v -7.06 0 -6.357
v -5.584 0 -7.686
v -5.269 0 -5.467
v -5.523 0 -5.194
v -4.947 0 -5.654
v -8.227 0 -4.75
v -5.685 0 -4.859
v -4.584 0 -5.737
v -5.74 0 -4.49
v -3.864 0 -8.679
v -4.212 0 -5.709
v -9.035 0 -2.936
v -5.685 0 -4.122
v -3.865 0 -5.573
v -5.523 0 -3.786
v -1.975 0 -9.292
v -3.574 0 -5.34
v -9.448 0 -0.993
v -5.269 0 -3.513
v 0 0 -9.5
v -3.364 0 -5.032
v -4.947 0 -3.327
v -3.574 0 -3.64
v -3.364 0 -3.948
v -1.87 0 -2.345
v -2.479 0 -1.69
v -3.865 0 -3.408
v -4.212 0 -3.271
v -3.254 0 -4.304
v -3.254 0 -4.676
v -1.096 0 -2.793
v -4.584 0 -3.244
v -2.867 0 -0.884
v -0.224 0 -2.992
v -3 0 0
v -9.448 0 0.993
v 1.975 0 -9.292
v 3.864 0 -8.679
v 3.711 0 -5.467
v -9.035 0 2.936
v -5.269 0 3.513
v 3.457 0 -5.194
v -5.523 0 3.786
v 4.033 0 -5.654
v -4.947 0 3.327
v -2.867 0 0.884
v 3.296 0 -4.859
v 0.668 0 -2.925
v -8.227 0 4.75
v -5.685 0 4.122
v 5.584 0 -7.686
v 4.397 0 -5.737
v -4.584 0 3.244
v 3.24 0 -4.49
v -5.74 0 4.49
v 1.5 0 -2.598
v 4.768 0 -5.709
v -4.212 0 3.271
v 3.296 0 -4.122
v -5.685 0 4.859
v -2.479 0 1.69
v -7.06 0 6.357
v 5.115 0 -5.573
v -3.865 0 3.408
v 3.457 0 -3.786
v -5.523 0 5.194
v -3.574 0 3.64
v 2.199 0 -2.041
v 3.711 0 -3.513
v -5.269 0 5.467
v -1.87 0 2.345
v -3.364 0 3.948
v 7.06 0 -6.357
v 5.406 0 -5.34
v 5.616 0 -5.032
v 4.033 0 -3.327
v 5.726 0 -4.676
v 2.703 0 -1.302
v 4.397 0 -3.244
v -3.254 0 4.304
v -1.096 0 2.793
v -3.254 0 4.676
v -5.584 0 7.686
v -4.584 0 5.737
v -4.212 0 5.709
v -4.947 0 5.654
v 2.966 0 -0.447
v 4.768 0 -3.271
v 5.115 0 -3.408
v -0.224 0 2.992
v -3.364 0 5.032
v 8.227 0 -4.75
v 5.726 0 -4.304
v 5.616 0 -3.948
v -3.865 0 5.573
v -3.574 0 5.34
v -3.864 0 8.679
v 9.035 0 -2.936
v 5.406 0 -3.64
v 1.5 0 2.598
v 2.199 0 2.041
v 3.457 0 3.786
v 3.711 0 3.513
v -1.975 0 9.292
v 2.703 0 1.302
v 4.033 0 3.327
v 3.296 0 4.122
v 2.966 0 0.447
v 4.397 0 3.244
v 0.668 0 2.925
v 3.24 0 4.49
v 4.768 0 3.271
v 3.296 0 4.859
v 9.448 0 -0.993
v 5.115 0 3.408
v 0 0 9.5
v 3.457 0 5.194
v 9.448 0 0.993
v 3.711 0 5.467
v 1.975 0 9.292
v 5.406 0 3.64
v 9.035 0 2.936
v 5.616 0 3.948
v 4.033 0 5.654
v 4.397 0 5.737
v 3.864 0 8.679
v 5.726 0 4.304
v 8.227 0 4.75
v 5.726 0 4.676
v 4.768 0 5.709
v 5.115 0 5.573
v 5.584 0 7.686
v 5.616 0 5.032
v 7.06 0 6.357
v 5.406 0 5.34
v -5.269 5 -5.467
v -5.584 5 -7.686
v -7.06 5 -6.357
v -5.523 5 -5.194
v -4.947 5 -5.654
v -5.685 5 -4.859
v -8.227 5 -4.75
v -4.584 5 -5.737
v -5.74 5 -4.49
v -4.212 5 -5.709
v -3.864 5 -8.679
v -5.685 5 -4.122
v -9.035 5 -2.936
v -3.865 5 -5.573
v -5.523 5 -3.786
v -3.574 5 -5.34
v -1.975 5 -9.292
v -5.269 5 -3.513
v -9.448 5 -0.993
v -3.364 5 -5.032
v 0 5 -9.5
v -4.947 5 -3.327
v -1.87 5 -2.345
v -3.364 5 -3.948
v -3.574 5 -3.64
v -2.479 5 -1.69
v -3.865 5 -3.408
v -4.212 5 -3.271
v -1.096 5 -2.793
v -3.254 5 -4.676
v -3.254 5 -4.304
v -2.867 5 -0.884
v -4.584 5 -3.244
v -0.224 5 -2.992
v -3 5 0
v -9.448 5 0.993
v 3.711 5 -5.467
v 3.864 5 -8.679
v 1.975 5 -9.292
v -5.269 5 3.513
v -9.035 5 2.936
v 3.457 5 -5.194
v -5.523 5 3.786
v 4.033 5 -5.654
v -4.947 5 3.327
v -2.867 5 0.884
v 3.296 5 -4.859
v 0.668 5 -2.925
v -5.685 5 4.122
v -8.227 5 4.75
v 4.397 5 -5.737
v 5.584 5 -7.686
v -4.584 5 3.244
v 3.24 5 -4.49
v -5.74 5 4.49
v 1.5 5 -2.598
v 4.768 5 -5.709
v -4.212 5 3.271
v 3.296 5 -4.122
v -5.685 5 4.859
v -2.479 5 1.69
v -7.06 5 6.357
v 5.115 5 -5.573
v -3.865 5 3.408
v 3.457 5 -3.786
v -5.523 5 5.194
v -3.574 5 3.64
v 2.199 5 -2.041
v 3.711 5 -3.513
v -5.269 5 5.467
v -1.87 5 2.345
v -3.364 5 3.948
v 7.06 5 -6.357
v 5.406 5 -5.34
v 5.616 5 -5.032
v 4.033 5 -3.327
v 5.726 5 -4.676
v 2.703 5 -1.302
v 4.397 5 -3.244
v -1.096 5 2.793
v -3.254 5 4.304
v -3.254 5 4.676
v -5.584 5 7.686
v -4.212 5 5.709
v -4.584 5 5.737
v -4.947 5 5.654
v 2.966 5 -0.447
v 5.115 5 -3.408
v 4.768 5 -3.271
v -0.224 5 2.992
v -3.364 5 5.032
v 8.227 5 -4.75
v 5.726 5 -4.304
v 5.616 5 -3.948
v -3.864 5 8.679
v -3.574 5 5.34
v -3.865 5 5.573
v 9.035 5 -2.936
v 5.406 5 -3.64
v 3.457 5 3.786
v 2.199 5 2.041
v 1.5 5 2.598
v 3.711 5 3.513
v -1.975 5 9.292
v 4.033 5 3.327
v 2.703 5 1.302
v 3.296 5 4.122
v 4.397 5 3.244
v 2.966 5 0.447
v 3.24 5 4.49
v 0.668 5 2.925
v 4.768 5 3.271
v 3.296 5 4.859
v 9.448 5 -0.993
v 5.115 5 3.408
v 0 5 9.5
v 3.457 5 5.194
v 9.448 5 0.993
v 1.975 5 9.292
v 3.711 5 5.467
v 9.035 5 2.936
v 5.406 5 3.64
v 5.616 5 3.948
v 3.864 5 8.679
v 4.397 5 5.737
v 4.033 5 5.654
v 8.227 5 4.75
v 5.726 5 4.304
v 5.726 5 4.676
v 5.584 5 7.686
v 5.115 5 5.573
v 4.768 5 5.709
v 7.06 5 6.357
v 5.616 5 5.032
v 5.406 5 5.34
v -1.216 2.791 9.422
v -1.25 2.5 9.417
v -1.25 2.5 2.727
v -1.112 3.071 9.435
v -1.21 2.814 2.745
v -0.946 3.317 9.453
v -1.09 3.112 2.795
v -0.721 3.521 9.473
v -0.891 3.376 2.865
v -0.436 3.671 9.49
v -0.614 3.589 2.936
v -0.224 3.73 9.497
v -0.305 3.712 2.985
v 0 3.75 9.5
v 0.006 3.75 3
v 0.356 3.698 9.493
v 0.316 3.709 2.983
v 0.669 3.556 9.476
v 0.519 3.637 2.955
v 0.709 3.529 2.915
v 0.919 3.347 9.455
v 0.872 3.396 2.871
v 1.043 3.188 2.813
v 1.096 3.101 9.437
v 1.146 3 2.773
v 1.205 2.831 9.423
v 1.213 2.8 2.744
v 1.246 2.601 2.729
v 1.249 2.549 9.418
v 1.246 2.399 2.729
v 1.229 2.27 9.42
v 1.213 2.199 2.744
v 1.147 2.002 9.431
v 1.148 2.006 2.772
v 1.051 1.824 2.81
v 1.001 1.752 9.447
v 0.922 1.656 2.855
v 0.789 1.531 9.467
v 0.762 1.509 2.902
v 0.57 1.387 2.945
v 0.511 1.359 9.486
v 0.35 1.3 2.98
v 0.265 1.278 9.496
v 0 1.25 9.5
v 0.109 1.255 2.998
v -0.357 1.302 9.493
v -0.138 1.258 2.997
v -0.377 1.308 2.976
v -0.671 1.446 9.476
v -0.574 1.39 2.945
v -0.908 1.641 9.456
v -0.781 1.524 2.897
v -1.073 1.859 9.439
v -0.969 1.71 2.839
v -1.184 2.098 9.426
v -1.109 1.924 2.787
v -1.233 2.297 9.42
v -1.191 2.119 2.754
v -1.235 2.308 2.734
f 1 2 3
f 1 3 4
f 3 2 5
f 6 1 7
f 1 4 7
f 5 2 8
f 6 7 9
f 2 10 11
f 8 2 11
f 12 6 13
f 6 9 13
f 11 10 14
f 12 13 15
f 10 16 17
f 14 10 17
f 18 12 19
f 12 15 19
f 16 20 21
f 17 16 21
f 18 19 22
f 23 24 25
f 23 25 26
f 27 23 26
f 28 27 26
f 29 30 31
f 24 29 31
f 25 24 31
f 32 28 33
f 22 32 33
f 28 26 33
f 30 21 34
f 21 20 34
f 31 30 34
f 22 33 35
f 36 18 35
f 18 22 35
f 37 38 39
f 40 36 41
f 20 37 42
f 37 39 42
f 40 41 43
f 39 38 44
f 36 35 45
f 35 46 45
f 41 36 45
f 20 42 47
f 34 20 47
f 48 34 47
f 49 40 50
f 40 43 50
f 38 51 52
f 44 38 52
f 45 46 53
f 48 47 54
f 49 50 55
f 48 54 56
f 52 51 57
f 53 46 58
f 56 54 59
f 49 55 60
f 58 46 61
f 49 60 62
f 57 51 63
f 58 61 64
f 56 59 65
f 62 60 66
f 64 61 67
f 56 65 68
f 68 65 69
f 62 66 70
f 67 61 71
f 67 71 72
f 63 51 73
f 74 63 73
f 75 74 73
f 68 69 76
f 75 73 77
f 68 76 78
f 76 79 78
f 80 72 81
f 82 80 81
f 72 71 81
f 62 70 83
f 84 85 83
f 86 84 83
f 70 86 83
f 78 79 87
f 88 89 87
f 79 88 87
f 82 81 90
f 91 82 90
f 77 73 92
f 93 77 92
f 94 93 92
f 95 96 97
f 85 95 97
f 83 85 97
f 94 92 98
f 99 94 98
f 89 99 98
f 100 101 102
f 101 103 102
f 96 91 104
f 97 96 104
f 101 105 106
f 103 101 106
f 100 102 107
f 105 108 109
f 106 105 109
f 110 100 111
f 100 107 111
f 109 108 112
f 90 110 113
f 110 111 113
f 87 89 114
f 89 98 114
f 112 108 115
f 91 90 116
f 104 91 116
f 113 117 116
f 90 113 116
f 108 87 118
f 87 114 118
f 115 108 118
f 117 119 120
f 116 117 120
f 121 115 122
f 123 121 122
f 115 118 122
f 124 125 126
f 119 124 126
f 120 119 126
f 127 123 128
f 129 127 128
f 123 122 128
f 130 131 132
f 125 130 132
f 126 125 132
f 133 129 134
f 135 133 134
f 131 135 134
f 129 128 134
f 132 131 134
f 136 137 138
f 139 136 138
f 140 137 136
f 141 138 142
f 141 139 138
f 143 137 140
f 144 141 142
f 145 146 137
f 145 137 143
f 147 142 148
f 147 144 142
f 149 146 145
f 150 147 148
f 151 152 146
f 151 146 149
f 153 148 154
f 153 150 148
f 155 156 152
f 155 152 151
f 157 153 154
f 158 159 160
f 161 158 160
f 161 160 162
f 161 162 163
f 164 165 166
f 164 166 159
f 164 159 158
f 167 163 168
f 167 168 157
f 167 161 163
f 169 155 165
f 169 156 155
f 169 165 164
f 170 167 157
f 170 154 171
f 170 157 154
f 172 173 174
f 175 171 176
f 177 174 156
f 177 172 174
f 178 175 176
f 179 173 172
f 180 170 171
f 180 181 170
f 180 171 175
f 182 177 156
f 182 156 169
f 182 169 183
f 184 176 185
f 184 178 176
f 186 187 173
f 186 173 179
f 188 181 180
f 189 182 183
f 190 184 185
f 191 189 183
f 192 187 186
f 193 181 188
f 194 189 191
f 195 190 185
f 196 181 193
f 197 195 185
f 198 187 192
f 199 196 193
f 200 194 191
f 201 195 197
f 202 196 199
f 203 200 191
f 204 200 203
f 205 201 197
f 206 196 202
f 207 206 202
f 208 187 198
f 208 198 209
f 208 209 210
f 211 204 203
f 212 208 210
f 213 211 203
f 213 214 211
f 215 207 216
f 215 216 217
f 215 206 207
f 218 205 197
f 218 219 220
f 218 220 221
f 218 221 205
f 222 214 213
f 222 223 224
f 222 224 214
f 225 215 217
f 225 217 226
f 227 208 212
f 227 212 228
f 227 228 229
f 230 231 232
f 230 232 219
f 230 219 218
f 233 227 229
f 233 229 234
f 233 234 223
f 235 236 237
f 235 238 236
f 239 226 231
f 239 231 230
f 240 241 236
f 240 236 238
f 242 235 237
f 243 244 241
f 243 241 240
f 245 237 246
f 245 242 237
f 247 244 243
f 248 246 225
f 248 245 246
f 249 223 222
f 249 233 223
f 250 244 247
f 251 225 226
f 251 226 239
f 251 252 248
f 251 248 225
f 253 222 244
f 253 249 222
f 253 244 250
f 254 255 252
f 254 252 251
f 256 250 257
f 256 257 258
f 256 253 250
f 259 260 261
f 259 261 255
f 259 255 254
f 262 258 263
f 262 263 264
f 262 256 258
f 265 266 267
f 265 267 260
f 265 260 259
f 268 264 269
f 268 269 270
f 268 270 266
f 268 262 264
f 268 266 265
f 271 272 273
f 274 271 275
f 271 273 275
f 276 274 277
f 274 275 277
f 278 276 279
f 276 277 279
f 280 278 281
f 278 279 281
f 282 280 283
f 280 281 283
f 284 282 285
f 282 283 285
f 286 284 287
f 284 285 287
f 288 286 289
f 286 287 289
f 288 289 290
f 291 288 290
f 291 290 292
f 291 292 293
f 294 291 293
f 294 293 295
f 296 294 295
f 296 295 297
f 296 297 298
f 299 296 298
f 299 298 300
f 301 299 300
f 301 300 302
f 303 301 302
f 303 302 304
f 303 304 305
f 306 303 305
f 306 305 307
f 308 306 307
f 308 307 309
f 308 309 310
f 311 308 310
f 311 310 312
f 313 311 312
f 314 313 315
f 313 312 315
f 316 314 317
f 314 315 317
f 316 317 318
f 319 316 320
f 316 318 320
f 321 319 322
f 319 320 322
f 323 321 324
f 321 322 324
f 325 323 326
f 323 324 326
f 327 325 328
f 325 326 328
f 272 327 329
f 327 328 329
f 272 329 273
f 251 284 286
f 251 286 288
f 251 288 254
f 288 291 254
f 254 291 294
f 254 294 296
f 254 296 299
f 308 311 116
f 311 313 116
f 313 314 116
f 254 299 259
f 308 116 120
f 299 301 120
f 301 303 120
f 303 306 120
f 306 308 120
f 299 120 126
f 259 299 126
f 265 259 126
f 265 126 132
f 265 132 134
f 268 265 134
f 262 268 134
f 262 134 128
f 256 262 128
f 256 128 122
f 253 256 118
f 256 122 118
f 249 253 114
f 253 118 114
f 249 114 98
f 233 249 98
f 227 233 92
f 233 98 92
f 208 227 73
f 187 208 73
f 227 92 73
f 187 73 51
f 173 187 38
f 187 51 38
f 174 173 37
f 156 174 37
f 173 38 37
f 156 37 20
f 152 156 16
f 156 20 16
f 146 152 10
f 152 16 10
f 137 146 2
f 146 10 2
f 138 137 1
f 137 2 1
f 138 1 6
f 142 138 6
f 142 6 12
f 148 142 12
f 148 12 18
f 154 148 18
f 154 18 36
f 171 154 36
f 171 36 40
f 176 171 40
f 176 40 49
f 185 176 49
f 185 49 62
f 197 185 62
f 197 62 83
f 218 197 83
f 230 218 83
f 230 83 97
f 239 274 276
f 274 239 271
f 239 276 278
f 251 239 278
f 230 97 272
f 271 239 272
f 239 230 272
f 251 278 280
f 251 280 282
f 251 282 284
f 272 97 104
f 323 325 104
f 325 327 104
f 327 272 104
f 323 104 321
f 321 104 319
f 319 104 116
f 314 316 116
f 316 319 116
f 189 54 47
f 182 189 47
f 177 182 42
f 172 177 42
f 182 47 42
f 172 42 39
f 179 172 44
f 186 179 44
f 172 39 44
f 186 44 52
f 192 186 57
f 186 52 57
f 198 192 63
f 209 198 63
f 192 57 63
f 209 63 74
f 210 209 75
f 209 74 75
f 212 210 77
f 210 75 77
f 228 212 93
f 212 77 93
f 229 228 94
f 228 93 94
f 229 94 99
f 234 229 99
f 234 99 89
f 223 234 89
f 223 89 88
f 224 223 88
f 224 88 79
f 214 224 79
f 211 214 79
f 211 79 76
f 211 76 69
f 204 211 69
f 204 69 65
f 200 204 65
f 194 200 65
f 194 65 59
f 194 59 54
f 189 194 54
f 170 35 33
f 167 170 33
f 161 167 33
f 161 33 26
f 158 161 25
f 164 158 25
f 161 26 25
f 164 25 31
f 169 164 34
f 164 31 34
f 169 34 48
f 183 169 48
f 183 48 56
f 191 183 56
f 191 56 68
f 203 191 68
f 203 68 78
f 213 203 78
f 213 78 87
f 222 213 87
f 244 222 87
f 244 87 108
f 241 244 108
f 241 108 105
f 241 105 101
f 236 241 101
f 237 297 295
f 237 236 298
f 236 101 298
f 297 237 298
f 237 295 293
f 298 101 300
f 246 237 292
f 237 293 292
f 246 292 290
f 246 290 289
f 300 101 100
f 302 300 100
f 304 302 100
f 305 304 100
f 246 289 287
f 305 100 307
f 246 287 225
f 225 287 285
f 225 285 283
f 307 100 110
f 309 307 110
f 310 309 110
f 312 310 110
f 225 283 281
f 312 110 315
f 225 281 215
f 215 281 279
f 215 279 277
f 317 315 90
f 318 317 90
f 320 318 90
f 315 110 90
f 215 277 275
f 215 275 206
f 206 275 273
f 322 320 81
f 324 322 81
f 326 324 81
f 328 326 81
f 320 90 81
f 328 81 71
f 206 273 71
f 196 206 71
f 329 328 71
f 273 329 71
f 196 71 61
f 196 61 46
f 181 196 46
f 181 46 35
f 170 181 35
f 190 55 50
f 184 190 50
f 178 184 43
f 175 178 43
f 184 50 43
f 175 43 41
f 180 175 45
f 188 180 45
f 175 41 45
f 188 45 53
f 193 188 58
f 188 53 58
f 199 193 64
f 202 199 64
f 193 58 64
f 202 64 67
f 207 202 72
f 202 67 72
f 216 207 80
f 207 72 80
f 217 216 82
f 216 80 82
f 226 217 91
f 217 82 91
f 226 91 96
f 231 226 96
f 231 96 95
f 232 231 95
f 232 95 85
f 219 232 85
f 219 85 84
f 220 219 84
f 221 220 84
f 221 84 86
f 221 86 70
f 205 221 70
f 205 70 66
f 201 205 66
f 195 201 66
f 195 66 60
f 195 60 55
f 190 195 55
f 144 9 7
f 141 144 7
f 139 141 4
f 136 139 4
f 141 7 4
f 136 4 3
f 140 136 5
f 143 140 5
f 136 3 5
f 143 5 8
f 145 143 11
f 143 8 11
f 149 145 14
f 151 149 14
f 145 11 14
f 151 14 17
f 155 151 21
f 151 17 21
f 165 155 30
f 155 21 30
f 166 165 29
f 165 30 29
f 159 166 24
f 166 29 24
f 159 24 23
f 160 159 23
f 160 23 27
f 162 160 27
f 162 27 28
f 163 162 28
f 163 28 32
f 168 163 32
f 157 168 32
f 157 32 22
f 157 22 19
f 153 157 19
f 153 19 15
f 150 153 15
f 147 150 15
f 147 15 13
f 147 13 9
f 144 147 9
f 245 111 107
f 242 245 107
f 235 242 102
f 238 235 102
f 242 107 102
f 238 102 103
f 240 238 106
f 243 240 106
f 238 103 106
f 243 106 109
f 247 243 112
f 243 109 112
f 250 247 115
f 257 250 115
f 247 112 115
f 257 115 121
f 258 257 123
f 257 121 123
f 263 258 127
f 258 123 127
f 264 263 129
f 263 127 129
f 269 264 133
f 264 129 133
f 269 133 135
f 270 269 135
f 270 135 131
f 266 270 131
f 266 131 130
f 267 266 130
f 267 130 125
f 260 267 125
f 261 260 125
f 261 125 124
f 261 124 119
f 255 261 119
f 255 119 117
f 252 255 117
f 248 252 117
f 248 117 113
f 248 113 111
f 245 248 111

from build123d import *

# Parameters (mm, degrees)
SKETCH1_R                 = 9.5
BOSS_EXTRUDE1_DEPTH       = 5
F_6_0MM_DOWEL_HOLE1_D     = 6
M3X0_5_TAPPED_HOLE1_D     = 2.5
M3X0_5_TAPPED_HOLE2_D     = 2.5
M3X0_5_TAPPED_HOLE2_DEPTH = 10
M3X0_5_TAPPED_HOLE2_TIP   = 0.751075774


with BuildPart() as part:
    # Sketch1 → Boss-Extrude1 (new body)
    with BuildSketch(Plane(origin=(0, 0, 0), x_dir=(1, 0, 0), z_dir=(0, 1, 0))):
        with Locations(Location((0, 0, 0), (0, 0, 270))):
            Circle(SKETCH1_R)
    extrude(amount=BOSS_EXTRUDE1_DEPTH)

    # Ø6.0mm Dowel Hole1 (through all)
    with Locations(Plane(origin=(0, 5, 0), x_dir=(1, 0, 0), z_dir=(0, 1, 0))):
        with Locations((0, 0)):
            Hole(F_6_0MM_DOWEL_HOLE1_D / 2)

    # M3x0.5 Tapped Hole1 (through all)
    with Locations(Plane(origin=(0, 5, 0), x_dir=(1, 0, 0), z_dir=(0, 1, 0))):
        with Locations((4.490128061, 4.490128061), (-4.490128061, 4.490128061), (-4.490128061, -4.490128061), (4.490128061, -4.490128061)):
            Hole(M3X0_5_TAPPED_HOLE1_D / 2)

    # M3x0.5 Tapped Hole2
    with Locations(Plane(origin=(0, 2.5, 9.5), x_dir=(1, 0, 0), z_dir=(0, 0, 1))):
        with Locations((0, 0)):
            Hole(M3X0_5_TAPPED_HOLE2_D / 2, depth=M3X0_5_TAPPED_HOLE2_DEPTH)
            with Locations((0, 0, -(M3X0_5_TAPPED_HOLE2_DEPTH + M3X0_5_TAPPED_HOLE2_TIP / 2))):  # 118° drill point
                Cone(0, M3X0_5_TAPPED_HOLE2_D / 2, M3X0_5_TAPPED_HOLE2_TIP, mode=Mode.SUBTRACT)


solid = part.part
